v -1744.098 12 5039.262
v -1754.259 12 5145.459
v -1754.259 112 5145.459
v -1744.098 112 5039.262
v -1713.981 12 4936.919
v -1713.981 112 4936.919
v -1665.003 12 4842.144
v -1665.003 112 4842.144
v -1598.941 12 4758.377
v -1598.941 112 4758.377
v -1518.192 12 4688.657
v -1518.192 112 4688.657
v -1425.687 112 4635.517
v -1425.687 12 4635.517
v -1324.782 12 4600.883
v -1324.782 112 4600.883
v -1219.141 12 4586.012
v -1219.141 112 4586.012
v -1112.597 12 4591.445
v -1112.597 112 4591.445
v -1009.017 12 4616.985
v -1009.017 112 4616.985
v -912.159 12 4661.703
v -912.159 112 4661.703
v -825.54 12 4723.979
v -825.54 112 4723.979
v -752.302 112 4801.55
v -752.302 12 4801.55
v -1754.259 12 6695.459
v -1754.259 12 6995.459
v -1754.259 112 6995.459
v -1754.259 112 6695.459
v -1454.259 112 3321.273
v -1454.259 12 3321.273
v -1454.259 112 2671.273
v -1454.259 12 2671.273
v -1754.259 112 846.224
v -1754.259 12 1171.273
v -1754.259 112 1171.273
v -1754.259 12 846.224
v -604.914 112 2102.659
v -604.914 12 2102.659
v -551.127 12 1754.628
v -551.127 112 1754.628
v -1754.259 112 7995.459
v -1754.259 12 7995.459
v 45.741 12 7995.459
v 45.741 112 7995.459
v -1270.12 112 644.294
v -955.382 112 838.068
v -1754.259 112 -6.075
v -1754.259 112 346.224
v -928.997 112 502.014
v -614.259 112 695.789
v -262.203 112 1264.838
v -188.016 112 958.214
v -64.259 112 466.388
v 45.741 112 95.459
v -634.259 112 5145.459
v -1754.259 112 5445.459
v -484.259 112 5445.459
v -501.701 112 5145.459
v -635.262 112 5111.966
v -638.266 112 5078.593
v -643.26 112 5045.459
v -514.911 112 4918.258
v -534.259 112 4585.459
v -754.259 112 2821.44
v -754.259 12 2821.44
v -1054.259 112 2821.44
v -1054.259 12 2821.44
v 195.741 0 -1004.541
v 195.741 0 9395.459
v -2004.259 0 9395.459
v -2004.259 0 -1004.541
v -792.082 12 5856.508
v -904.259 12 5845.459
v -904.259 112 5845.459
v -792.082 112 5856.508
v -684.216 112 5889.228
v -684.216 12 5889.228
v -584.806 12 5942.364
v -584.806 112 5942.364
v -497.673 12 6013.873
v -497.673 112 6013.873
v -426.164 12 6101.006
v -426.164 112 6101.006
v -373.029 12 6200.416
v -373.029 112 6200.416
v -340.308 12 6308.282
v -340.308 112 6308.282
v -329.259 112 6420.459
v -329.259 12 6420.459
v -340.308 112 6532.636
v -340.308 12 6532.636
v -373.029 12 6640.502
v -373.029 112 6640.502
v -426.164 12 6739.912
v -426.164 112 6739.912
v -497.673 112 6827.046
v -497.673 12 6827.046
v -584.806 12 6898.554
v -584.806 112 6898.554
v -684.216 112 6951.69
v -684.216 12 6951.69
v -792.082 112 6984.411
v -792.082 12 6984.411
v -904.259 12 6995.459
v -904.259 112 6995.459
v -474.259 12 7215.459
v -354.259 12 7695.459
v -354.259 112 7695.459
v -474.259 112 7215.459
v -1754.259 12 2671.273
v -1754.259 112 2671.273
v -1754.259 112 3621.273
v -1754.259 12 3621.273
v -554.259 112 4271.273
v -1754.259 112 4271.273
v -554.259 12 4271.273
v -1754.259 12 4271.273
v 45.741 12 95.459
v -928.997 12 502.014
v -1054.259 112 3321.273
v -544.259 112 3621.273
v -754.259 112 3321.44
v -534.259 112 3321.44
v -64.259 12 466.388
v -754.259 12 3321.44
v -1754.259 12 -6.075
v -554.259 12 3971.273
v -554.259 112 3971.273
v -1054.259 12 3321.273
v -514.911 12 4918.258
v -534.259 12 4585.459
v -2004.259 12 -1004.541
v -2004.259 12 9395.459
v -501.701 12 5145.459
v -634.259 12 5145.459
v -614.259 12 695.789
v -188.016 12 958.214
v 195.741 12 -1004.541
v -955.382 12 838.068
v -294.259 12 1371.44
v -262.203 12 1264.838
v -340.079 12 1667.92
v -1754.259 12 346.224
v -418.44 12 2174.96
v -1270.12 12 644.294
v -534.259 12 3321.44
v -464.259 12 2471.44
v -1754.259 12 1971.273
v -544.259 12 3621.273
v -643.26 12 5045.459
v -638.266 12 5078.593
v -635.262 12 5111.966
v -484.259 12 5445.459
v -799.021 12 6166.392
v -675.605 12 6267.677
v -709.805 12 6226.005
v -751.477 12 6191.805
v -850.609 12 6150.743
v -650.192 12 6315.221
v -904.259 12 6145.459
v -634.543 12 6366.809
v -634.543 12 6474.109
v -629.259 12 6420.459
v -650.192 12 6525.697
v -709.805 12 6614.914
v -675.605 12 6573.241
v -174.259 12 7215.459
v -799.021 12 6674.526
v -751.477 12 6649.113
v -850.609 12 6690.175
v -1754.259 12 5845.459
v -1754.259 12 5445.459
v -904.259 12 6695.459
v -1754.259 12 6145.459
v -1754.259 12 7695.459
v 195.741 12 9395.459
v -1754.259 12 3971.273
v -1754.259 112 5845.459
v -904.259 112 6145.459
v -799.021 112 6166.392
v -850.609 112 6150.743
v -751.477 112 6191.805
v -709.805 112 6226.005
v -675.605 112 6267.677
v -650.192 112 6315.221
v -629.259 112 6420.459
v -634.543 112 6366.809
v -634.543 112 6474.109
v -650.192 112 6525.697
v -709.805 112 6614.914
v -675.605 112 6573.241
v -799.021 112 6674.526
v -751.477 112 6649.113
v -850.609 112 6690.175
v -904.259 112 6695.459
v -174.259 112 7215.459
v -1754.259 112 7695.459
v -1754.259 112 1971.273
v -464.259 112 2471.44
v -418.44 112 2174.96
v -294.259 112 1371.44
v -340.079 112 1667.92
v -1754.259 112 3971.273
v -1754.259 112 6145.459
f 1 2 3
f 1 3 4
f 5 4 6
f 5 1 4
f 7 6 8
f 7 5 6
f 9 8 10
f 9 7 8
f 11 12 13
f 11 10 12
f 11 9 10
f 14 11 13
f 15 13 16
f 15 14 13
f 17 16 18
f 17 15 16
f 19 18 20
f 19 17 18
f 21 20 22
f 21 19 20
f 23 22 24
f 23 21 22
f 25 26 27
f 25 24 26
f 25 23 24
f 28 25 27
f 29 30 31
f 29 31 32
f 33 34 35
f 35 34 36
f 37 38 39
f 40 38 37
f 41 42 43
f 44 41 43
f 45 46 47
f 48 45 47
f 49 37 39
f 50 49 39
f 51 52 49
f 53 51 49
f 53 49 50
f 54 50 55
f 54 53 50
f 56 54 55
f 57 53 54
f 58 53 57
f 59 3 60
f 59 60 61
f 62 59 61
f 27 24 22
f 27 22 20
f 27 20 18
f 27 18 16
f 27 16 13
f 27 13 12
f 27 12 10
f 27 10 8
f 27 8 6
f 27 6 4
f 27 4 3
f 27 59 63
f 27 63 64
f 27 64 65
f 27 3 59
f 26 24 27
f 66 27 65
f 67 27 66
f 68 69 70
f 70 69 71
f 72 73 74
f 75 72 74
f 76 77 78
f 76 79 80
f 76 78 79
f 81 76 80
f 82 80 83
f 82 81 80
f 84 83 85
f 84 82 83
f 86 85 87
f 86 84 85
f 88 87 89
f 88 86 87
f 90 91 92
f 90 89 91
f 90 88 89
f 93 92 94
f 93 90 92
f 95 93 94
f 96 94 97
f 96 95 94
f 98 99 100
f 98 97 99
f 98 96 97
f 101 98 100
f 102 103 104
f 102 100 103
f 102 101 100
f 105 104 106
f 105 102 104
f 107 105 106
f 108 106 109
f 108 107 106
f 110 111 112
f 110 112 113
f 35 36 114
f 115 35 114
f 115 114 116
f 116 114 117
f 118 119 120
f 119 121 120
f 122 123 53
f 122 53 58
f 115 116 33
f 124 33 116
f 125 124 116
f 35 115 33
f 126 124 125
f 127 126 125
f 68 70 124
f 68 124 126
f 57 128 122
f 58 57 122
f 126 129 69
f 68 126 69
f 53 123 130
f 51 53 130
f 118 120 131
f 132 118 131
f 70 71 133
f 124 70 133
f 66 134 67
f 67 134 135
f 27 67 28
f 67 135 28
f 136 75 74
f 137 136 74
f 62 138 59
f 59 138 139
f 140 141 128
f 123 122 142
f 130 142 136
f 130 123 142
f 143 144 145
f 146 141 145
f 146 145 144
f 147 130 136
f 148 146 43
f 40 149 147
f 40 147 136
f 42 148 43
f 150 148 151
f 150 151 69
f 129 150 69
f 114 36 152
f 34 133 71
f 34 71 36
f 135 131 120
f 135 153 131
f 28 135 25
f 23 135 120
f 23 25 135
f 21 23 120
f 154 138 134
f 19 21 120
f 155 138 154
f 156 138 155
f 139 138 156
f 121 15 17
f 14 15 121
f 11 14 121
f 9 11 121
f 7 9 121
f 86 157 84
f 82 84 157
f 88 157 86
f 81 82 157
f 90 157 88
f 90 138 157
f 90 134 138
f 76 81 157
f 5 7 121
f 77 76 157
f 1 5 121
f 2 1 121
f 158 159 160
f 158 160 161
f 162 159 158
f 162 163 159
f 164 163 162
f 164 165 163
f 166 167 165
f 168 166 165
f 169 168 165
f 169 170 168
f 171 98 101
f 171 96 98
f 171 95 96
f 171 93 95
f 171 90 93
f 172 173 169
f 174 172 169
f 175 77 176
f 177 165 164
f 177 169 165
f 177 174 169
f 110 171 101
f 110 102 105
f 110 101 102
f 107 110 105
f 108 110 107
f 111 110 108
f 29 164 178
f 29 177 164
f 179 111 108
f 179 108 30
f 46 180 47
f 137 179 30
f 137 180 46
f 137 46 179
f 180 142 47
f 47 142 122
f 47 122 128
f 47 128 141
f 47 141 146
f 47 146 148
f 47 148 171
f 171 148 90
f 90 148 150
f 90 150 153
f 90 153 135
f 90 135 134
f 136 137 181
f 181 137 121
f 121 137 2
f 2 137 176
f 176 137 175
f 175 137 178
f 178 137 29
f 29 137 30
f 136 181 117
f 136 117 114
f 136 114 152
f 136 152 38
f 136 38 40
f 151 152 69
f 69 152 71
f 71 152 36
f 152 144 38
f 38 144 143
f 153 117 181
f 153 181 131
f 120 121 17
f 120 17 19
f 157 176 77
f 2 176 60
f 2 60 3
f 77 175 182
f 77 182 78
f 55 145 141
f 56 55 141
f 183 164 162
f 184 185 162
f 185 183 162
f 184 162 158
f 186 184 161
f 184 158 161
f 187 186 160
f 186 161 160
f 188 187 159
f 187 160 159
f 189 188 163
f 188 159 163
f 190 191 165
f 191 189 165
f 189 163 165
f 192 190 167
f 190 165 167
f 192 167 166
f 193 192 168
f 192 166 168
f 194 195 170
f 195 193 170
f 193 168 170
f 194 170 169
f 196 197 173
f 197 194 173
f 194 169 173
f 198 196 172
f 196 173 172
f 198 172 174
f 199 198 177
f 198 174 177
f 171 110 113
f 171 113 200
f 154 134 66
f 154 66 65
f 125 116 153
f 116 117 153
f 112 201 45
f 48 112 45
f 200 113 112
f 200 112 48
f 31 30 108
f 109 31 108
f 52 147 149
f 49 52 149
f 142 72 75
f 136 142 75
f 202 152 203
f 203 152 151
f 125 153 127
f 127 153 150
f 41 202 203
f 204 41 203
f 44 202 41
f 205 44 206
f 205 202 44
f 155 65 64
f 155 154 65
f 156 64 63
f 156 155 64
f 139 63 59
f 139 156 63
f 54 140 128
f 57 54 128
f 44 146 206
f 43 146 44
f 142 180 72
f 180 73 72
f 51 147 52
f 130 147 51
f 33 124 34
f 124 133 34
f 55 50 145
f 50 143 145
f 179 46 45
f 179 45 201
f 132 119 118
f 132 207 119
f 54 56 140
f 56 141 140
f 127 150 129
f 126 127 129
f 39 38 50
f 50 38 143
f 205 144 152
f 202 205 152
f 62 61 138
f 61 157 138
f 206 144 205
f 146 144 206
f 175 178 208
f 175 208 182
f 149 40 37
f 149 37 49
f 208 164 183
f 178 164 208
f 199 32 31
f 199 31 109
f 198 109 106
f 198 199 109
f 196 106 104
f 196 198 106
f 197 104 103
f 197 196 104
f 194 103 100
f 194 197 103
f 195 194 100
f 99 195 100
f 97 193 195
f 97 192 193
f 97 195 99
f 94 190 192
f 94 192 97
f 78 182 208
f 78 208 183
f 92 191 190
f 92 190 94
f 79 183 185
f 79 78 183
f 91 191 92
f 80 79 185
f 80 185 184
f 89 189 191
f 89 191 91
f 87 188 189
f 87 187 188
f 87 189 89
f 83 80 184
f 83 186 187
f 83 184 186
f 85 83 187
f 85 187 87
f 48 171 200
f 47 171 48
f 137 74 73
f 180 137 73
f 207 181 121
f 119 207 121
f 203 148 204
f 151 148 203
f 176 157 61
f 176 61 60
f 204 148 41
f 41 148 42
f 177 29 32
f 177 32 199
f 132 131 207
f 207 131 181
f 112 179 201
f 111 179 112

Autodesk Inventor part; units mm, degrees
ref_plane "YZ Plane" through (0, 0, 0) normal (1, 0, 0) x (0, 1, 0)
ref_plane "XZ Plane" through (0, 0, 0) normal (0, 1, 0) x (-1, 0, 0)
ref_plane "XY Plane" through (0, 0, 0) normal (0, 0, 1) x (1, 0, 0)
sketch "Sketch1" plane through (0, 0, 0) normal (0, 1, 0) x (-1, 0, 0)
  line L0 (2004.2593, 9395.4592) -> (-195.7407, 9395.4592)
  line L1 (-195.7407, 9395.4592) -> (-195.7407, -1004.5408)
  line L2 (-195.7407, -1004.5408) -> (2004.2593, -1004.5408)
  line L3 (2004.2593, -1004.5408) -> (2004.2593, 9395.4592)
  point P0 (0, 0)
  dimension "d0" = 2200
  dimension "d1" = 10400
extrude "Extrusion1" add sketch "Sketch1" along normal blind 12
sketch "L" plane through (0, 12, 0) normal (0, 1, 0) x (1, 0, 0)
  line L0 (-2004.2593, -9395.4592) -> (195.7407, -9395.4592) projected
  line L1 (195.7407, -9395.4592) -> (195.7407, 1004.5408) projected
  line L2 (195.7407, 1004.5408) -> (-2004.2593, 1004.5408) projected
  line L3 (-2004.2593, 1004.5408) -> (-2004.2593, -9395.4592) projected
  line L4 (-2004.2593, -9395.4592) -> (195.7407, -9395.4592) projected
  line L5 (-106.1637, 1004.5408) -> (-106.1637, -95.4592)
  line L6 (-1754.2593, -7995.4592) -> (45.7407, -7995.4592)
  line L7 (-1754.2593, -7995.4592) -> (-1754.2593, -7695.4592)
  line L8 (-1754.2593, -7695.4592) -> (-354.2593, -7695.4592)
  line L9 (-354.2593, -7695.4592) -> (-474.2593, -7215.4592)
  line L10 (-474.2593, -7215.4592) -> (-174.2593, -7215.4592)
  line L11 (-174.2593, -7215.4592) -> (45.7407, -7995.4592)
  line L12 (45.7407, -7995.4592) -> (45.7407, -7215.4592)
  line L13 (152.3488, -8495.1819) -> (932.3488, -8495.1819) construction
  line L14 (45.7407, -7215.4592) -> (-174.2593, -7215.4592)
  line L15 (-1754.2593, -8478.1639) -> (-2004.2593, -8478.1639)
  line L16 (-1343.0832, -7995.4592) -> (-1343.0832, -9395.4592)
  line L17 (-1343.0832, -7995.4592) -> (-1343.0832, -8175.4592)
  line L18 (-324.2593, -7215.4592) -> (-324.2593, -7035.4592)
  point P0 (0, 0)
  dimension "d79" = 1100
  dimension "d89" = 1800
  dimension "d90" = 300
  dimension "d91" = 1400
  dimension "d93" = 300
  dimension "d95" = 90
  dimension "d96" = 220
  dimension "d97" = 250
  dimension "d98" = 1400
  dimension "d204" = 180
  dimension "d206" = 780
  dimension "d207" = 180
sketch "U" plane through (0, 12, 0) normal (0, 1, 0) x (1, 0, 0)
  line L0 (-1754.2593, -6995.4592) -> (-1754.2593, -6695.4592)
  line L1 (-1754.2593, -6695.4592) -> (-904.2593, -6695.4592)
  line L2 (-904.2593, -6695.4592) -> (-904.2593, -6145.4592)
  line L3 (-904.2593, -6145.4592) -> (-1754.2593, -6145.4592)
  line L4 (-1754.2593, -6145.4592) -> (-1754.2593, -5845.4592)
  line L5 (-1754.2593, -5845.4592) -> (-904.2593, -5845.4592)
  arc A0 (-904.2593, -6695.4592) -> (-904.2593, -6145.4592) centre (-904.2593, -6420.4592) ccw
  line L6 (-1754.2593, -7695.4592) -> (-354.2593, -7695.4592) projected
  line L7 (-904.2593, -6995.4592) -> (-904.2593, -7695.4592)
  line L8 (-1754.2593, -6878.4482) -> (-2004.2593, -6878.4482)
  line L9 (-2004.2593, 1004.5408) -> (-2004.2593, -9395.4592) projected
  arc A1 (-904.2593, -6995.4592) -> (-904.2593, -5845.4592) centre (-904.2593, -6420.4592) ccw
  line L10 (-1754.2593, -6995.4592) -> (-904.2593, -6995.4592)
  point P0 (0, 0)
  point P1 (-1409.2346, -6695.4592)
  dimension "d99" = 850
  dimension "d100" = 300
  dimension "d101" = 850
  dimension "d102" = 550
  dimension "d103" = 300
  dimension "d104" = 700
  dimension "d105" = 250
sketch "R" plane through (0, 12, 0) normal (0, 1, 0) x (1, 0, 0)
  line L0 (-484.2593, -5445.4592) -> (-1754.2593, -5445.4592)
  line L1 (-501.7012, -5145.4592) -> (-634.2593, -5145.4592)
  line L2 (-1754.2593, -5445.4592) -> (-1754.2593, -5145.4592)
  line L3 (-1754.2593, -5845.4592) -> (-854.2593, -5845.4592) projected
  line L4 (-2004.2593, 1004.5408) -> (-2004.2593, -9395.4592) projected
  line L5 (-534.2593, -4585.4592) -> (-752.3018, -4801.55)
  line L6 (-514.9106, -4918.2583) -> (-643.2602, -5045.4592)
  arc A0 (-634.2593, -5145.4592) -> (-1754.2593, -5145.4592) centre (-1194.2593, -5145.4592) ccw
  line L7 (-484.2593, -5445.4592) -> (-501.7012, -5145.4592)
  line L8 (-514.9106, -4918.2583) -> (-534.2593, -4585.4592)
  line L9 (-2004.2593, -9395.4592) -> (195.7407, -9395.4592) projected
  line L10 (195.7407, -9395.4592) -> (195.7407, 1004.5408) projected
  line L11 (195.7407, 1004.5408) -> (-2004.2593, 1004.5408) projected
  line L12 (-2004.2593, 1004.5408) -> (-2004.2593, -9395.4592) projected
  line L13 (-1754.2593, -5145.4592) -> (-1194.2593, -5145.4592)
  line L14 (-1754.2593, -5145.4592) -> (-1194.2593, -5145.4592)
  point P0 (0, 0)
  dimension "d107" = 1270
  dimension "d113" = 300
  dimension "d210" = 300
  dimension "d212" = 50
  dimension "d214" = 250
  dimension "d218" = 400
  dimension "d219" = 1120
  dimension "d220" = 100
  dimension "d221" = 250
  dimension "d223" = 300
  dimension "d224" = 860
  dimension "d225" = 17.4419
  dimension "d226" = 30.6512
  dimension "d227" = 560
  dimension "d228" = 332.7991
  dimension "d229" = 150
sketch "I" plane through (0, 12, 0) normal (0, 1, 0) x (1, 0, 0)
  line L0 (-1754.2593, -4271.2731) -> (-554.2593, -4271.2731)
  line L1 (-554.2593, -4271.2731) -> (-554.2593, -3971.2731)
  line L2 (-554.2593, -3971.2731) -> (-1754.2593, -3971.2731)
  line L3 (-1754.2593, -3971.2731) -> (-1754.2593, -4271.2731)
  line L4 (-1754.2593, -4121.2731) -> (-2004.2593, -4121.2731)
  line L5 (-2004.2593, 1004.5408) -> (-2004.2593, -9395.4592) projected
  line L6 (-804.2593, -4745.4592) -> (-494.0035, -4642.0405) projected
  line L7 (-484.2593, -4671.2731) -> (-484.2593, -4271.2731)
  line L8 (-554.2593, -4271.2731) -> (-484.2593, -4271.2731)
  point P0 (0, 0)
  dimension "d116" = 1200
  dimension "d117" = 300
  dimension "d118" = 250
  dimension "d119" = 400
sketch "F" plane through (0, 12, 0) normal (0, 1, 0) x (1, 0, 0)
  line L0 (-554.2593, -3971.2731) -> (-1754.2593, -3971.2731) projected
  line L1 (-1754.2593, -3621.2731) -> (-544.2593, -3621.2731)
  line L2 (-544.2593, -3621.2731) -> (-534.2593, -3321.4398)
  line L3 (-534.2593, -3321.4398) -> (-754.2593, -3321.4398)
  line L4 (-754.2593, -3321.4398) -> (-754.2593, -2821.4398)
  line L5 (-754.2593, -2821.4398) -> (-1054.2593, -2821.4398)
  line L6 (-1054.2593, -2821.4398) -> (-1054.2593, -3321.2731)
  line L7 (-1054.2593, -3321.2731) -> (-1454.2593, -3321.2731)
  line L8 (-1454.2593, -3321.2731) -> (-1454.2593, -2671.2731)
  line L9 (-1454.2593, -2671.2731) -> (-1754.2593, -2671.2731)
  line L10 (-1754.2593, -2671.2731) -> (-1754.2593, -3621.2731)
  line L11 (-1754.2593, -3971.2731) -> (-1754.2593, -4271.2731) projected
  line L12 (-1754.2593, -3254.3076) -> (-2004.2593, -3254.3076)
  line L13 (-2004.2593, 1004.5408) -> (-2004.2593, -9395.4592) projected
  line L14 (-1303.0158, -3621.2731) -> (-1303.0158, -3971.2731)
  line L15 (-1238.9692, -3321.2731) -> (-1238.9692, -3621.2731)
  line L16 (-2004.2593, -9395.4592) -> (195.7407, -9395.4592) projected
  line L17 (195.7407, -9395.4592) -> (195.7407, 1004.5408) projected
  line L18 (195.7407, 1004.5408) -> (-2004.2593, 1004.5408) projected
  line L19 (-2004.2593, 1004.5408) -> (-2004.2593, -9395.4592) projected
  point P0 (0, 0)
  dimension "d120" = 1210
  dimension "d121" = 300
  dimension "d122" = 220
  dimension "d123" = 500
  dimension "d124" = 300
  dimension "d125" = 400
  dimension "d126" = 650
  dimension "d127" = 300
  dimension "d128" = 250
  dimension "d129" = 350
  dimension "d130" = 300
sketch "A" plane through (0, 12, 0) normal (0, 1, 0) x (1, 0, 0)
  line L0 (-464.2593, -2471.4398) -> (-294.2593, -2471.4398)
  line L1 (-294.2593, -2471.4398) -> (-294.2593, -1371.4398)
  line L2 (-294.2593, -1371.4398) -> (-464.2593, -2471.4398)
  line L3 (-1754.2593, -2671.2731) -> (-1754.2593, -3621.2731) projected
  line L4 (-1454.2593, -2671.2731) -> (-1754.2593, -2671.2731) projected
  line L5 (-1754.2593, -2671.2731) -> (-1754.2593, -1971.2731)
  line L6 (-1754.2593, -1971.2731) -> (-464.2593, -2471.4398)
  line L7 (-294.2593, -1371.4398) -> (-1754.2593, -1971.2731)
  line L8 (-544.2593, -3621.2731) -> (-534.2593, -3321.4398) projected
  line L9 (-534.2593, -3321.4398) -> (-754.2593, -3321.4398) projected
  line L10 (-464.2593, -2471.4398) -> (-418.4397, -2174.9595)
  line L11 (-418.4397, -2174.9595) -> (-604.9137, -2102.6586)
  line L12 (-604.9137, -2102.6586) -> (-551.1272, -1754.6281)
  line L13 (-294.2593, -1371.4398) -> (-340.079, -1667.9201)
  line L14 (-340.079, -1667.9201) -> (-551.1272, -1754.6281)
  line L15 (-1754.2593, -7995.4592) -> (45.7407, -7995.4592) projected
  line L16 (45.7407, -7995.4592) -> (45.7407, -95.4592)
  line L17 (-534.2593, -3321.4398) -> (-534.2593, -2471.4398)
  line L18 (-534.2593, -2471.4398) -> (-464.2593, -2471.4398)
  line L19 (-418.4397, -2174.9595) -> (-410.803, -2125.5461)
  line L20 (-604.9137, -2102.6586) -> (-1360.7491, -1809.6015)
  line L21 (-1360.7491, -1809.6015) -> (-1754.2593, -1971.2731)
  line L22 (-551.1272, -1754.6281) -> (-1406.5688, -2106.0818)
  point P0 (0, 0)
  dimension "d137" = 170
  dimension "d138" = 1100
  dimension "d139" = 700
  dimension "d141" = 300
  dimension "d142" = 200
  dimension "d144" = 300
  dimension "d147" = 7900
  dimension "d186" = 850
  dimension "d187" = 70
  dimension "d188" = 50
  dimension "d254" = 211.0482
sketch "X" plane through (0, 12, 0) normal (0, 1, 0) x (1, 0, 0)
  line L0 (-294.2593, -1371.4398) -> (-1754.2593, -1971.2731) projected
  line L1 (-294.2593, -2471.4398) -> (-294.2593, -1371.4398) projected
  line L2 (45.7407, -7995.4592) -> (45.7407, -95.4592) projected
  line L3 (-64.2593, -466.3883) -> (45.7407, -95.4592)
  line L4 (-1754.2593, -1971.2731) -> (-1754.2593, 739.9844)
  line L5 (-262.203, -1264.8378) -> (-188.0155, -958.2141)
  line L6 (-1754.2593, -346.224) -> (-1270.1203, -644.2937)
  line L7 (-955.3825, -838.0683) -> (-262.203, -1264.8378)
  line L8 (-1754.2593, -846.224) -> (-1270.1203, -644.2937)
  line L9 (-928.9972, -502.0141) -> (45.7407, -95.4592)
  line L10 (-1754.2593, -1171.2731) -> (-955.3825, -838.0683)
  line L11 (-614.2593, -695.7887) -> (-64.2593, -466.3883)
  line L12 (-188.0155, -958.2141) -> (-614.2593, -695.7887)
  line L13 (-928.9972, -502.0141) -> (-1754.2593, 6.0748)
  line L14 (-2004.2593, -9395.4592) -> (195.7407, -9395.4592) projected
  line L15 (195.7407, -9395.4592) -> (195.7407, 1004.5408) projected
  line L16 (195.7407, 1004.5408) -> (-2004.2593, 1004.5408) projected
  line L17 (-2004.2593, 1004.5408) -> (-2004.2593, -9395.4592) projected
  line L18 (45.7407, -95.4592) -> (195.7407, -95.4592)
  line L19 (-64.2593, -466.3883) -> (45.7407, -420.5082)
  line L20 (45.7407, -95.4592) -> (-1754.2593, -95.4592)
  line L21 (-262.203, -1264.8378) -> (45.7407, -1454.4294)
  line L22 (-188.0155, -958.2141) -> (45.7407, -1102.1306)
  point P0 (-1754.2593, -1221.2731)
  dimension "d242" = 110
  dimension "d243" = 800
  dimension "d245" = 500
  dimension "d246" = 550
  dimension "d247" = 300
  dimension "d248" = 300
  dimension "d252" = 150
  dimension "d253" = 325.0491
  dimension "d255" = 250.7649
  dimension "d256" = 325.0491
  dimension "d257" = 352.2988
  dimension "d261" = 681.6224
  dimension "d262" = 352.2988
sketch "Moduler" plane through (0, 12, 0) normal (0, 1, 0) x (1, 0, 0)
  line L0 (195.7407, -9395.4592) -> (933.3112, -9395.4592)
  line L1 (933.3112, -9395.4592) -> (933.3112, -8385.4592)
  line L2 (933.3112, -8385.4592) -> (-2004.2593, -8385.4592)
  line L3 (933.3112, -8385.4592) -> (933.3112, -7245.4592)
  line L4 (933.3112, -7245.4592) -> (-2004.2593, -7245.4592)
  line L5 (933.3112, -7245.4592) -> (933.3112, -6025.4592)
  line L6 (933.3112, -6025.4592) -> (-2004.2593, -6025.4592)
  line L7 (-2004.2593, 1004.5408) -> (-2004.2593, -9395.4592) projected
  line L8 (933.3112, -6025.4592) -> (933.3112, -4685.4592)
  line L9 (933.3112, -4685.4592) -> (-2004.2593, -4685.4592)
  line L10 (933.3112, -4685.4592) -> (933.3112, -3935.4592)
  line L11 (933.3112, -3935.4592) -> (-2004.2593, -3935.4592)
  line L12 (933.3112, -3935.4592) -> (933.3112, -2715.4592)
  line L13 (933.3112, -2715.4592) -> (-2004.2593, -2715.4592)
  line L14 (933.3112, -2715.4592) -> (933.3112, -1495.4592)
  line L15 (933.3112, -1495.4592) -> (-2004.2593, -1495.4592)
  line L16 (933.3112, -1495.4592) -> (933.3112, -85.4592)
  line L17 (933.3112, -85.4592) -> (-2004.2593, -85.4592)
  line L18 (933.3112, -85.4592) -> (933.3112, 974.5408)
  line L19 (933.3112, 974.5408) -> (-2004.2593, 974.5408)
  point P0 (0, 0)
  dimension "d150" = 1010
  dimension "d151" = 1140
  dimension "d152" = 1220
  dimension "d153" = 1340
  dimension "d154" = 750
  dimension "d155" = 1220
  dimension "d157" = 1410
  dimension "d222" = 1060
  dimension "d263" = 1220
extrude "Extrusion2" add sketch "L" along normal blind 100 contours L6 L7 L8 L9 L10 L11
extrude "Extrusion3" add sketch "U" along normal blind 100 contours L0 L1 A0 L3 L4 L5 A1 L10
extrude "Extrusion5" add sketch "I" along normal blind 100
extrude "Extrusion6" add sketch "F" along normal blind 100 contours L10 L9 L8 L7 L15 L1 | L15 L7 L6 L5 L4 L3 L2 L1
extrude "Extrusion7" add sketch "A" along normal blind 100 contours L6 L22 L20 L11 L2 | L6 L7 L20 L22 | L2 L14 L22 L20 L7 | L20 L22 L12
sketch "Sketch14" plane through (0, 12, 0) normal (0, 1, 0) x (1, 0, 0)
  arc A0 (45.7407, -95.4592) -> (45.7407, -7995.4592) centre (12745.7407, -4045.4592) ccw
  point P0 (0, 0)
extrude "Extrusion10" add sketch "R" along normal blind 100 contours L0 L2 A0 L1 L7 | L5 L8 L6 A0
extrude "Extrusion11" add sketch "X" along normal blind 100 contours L7 L10 L4 L8 L6 L20 L13 L9 L3 L11 L12 L5 | L20 L4 L13
properties part number "skilt2"
